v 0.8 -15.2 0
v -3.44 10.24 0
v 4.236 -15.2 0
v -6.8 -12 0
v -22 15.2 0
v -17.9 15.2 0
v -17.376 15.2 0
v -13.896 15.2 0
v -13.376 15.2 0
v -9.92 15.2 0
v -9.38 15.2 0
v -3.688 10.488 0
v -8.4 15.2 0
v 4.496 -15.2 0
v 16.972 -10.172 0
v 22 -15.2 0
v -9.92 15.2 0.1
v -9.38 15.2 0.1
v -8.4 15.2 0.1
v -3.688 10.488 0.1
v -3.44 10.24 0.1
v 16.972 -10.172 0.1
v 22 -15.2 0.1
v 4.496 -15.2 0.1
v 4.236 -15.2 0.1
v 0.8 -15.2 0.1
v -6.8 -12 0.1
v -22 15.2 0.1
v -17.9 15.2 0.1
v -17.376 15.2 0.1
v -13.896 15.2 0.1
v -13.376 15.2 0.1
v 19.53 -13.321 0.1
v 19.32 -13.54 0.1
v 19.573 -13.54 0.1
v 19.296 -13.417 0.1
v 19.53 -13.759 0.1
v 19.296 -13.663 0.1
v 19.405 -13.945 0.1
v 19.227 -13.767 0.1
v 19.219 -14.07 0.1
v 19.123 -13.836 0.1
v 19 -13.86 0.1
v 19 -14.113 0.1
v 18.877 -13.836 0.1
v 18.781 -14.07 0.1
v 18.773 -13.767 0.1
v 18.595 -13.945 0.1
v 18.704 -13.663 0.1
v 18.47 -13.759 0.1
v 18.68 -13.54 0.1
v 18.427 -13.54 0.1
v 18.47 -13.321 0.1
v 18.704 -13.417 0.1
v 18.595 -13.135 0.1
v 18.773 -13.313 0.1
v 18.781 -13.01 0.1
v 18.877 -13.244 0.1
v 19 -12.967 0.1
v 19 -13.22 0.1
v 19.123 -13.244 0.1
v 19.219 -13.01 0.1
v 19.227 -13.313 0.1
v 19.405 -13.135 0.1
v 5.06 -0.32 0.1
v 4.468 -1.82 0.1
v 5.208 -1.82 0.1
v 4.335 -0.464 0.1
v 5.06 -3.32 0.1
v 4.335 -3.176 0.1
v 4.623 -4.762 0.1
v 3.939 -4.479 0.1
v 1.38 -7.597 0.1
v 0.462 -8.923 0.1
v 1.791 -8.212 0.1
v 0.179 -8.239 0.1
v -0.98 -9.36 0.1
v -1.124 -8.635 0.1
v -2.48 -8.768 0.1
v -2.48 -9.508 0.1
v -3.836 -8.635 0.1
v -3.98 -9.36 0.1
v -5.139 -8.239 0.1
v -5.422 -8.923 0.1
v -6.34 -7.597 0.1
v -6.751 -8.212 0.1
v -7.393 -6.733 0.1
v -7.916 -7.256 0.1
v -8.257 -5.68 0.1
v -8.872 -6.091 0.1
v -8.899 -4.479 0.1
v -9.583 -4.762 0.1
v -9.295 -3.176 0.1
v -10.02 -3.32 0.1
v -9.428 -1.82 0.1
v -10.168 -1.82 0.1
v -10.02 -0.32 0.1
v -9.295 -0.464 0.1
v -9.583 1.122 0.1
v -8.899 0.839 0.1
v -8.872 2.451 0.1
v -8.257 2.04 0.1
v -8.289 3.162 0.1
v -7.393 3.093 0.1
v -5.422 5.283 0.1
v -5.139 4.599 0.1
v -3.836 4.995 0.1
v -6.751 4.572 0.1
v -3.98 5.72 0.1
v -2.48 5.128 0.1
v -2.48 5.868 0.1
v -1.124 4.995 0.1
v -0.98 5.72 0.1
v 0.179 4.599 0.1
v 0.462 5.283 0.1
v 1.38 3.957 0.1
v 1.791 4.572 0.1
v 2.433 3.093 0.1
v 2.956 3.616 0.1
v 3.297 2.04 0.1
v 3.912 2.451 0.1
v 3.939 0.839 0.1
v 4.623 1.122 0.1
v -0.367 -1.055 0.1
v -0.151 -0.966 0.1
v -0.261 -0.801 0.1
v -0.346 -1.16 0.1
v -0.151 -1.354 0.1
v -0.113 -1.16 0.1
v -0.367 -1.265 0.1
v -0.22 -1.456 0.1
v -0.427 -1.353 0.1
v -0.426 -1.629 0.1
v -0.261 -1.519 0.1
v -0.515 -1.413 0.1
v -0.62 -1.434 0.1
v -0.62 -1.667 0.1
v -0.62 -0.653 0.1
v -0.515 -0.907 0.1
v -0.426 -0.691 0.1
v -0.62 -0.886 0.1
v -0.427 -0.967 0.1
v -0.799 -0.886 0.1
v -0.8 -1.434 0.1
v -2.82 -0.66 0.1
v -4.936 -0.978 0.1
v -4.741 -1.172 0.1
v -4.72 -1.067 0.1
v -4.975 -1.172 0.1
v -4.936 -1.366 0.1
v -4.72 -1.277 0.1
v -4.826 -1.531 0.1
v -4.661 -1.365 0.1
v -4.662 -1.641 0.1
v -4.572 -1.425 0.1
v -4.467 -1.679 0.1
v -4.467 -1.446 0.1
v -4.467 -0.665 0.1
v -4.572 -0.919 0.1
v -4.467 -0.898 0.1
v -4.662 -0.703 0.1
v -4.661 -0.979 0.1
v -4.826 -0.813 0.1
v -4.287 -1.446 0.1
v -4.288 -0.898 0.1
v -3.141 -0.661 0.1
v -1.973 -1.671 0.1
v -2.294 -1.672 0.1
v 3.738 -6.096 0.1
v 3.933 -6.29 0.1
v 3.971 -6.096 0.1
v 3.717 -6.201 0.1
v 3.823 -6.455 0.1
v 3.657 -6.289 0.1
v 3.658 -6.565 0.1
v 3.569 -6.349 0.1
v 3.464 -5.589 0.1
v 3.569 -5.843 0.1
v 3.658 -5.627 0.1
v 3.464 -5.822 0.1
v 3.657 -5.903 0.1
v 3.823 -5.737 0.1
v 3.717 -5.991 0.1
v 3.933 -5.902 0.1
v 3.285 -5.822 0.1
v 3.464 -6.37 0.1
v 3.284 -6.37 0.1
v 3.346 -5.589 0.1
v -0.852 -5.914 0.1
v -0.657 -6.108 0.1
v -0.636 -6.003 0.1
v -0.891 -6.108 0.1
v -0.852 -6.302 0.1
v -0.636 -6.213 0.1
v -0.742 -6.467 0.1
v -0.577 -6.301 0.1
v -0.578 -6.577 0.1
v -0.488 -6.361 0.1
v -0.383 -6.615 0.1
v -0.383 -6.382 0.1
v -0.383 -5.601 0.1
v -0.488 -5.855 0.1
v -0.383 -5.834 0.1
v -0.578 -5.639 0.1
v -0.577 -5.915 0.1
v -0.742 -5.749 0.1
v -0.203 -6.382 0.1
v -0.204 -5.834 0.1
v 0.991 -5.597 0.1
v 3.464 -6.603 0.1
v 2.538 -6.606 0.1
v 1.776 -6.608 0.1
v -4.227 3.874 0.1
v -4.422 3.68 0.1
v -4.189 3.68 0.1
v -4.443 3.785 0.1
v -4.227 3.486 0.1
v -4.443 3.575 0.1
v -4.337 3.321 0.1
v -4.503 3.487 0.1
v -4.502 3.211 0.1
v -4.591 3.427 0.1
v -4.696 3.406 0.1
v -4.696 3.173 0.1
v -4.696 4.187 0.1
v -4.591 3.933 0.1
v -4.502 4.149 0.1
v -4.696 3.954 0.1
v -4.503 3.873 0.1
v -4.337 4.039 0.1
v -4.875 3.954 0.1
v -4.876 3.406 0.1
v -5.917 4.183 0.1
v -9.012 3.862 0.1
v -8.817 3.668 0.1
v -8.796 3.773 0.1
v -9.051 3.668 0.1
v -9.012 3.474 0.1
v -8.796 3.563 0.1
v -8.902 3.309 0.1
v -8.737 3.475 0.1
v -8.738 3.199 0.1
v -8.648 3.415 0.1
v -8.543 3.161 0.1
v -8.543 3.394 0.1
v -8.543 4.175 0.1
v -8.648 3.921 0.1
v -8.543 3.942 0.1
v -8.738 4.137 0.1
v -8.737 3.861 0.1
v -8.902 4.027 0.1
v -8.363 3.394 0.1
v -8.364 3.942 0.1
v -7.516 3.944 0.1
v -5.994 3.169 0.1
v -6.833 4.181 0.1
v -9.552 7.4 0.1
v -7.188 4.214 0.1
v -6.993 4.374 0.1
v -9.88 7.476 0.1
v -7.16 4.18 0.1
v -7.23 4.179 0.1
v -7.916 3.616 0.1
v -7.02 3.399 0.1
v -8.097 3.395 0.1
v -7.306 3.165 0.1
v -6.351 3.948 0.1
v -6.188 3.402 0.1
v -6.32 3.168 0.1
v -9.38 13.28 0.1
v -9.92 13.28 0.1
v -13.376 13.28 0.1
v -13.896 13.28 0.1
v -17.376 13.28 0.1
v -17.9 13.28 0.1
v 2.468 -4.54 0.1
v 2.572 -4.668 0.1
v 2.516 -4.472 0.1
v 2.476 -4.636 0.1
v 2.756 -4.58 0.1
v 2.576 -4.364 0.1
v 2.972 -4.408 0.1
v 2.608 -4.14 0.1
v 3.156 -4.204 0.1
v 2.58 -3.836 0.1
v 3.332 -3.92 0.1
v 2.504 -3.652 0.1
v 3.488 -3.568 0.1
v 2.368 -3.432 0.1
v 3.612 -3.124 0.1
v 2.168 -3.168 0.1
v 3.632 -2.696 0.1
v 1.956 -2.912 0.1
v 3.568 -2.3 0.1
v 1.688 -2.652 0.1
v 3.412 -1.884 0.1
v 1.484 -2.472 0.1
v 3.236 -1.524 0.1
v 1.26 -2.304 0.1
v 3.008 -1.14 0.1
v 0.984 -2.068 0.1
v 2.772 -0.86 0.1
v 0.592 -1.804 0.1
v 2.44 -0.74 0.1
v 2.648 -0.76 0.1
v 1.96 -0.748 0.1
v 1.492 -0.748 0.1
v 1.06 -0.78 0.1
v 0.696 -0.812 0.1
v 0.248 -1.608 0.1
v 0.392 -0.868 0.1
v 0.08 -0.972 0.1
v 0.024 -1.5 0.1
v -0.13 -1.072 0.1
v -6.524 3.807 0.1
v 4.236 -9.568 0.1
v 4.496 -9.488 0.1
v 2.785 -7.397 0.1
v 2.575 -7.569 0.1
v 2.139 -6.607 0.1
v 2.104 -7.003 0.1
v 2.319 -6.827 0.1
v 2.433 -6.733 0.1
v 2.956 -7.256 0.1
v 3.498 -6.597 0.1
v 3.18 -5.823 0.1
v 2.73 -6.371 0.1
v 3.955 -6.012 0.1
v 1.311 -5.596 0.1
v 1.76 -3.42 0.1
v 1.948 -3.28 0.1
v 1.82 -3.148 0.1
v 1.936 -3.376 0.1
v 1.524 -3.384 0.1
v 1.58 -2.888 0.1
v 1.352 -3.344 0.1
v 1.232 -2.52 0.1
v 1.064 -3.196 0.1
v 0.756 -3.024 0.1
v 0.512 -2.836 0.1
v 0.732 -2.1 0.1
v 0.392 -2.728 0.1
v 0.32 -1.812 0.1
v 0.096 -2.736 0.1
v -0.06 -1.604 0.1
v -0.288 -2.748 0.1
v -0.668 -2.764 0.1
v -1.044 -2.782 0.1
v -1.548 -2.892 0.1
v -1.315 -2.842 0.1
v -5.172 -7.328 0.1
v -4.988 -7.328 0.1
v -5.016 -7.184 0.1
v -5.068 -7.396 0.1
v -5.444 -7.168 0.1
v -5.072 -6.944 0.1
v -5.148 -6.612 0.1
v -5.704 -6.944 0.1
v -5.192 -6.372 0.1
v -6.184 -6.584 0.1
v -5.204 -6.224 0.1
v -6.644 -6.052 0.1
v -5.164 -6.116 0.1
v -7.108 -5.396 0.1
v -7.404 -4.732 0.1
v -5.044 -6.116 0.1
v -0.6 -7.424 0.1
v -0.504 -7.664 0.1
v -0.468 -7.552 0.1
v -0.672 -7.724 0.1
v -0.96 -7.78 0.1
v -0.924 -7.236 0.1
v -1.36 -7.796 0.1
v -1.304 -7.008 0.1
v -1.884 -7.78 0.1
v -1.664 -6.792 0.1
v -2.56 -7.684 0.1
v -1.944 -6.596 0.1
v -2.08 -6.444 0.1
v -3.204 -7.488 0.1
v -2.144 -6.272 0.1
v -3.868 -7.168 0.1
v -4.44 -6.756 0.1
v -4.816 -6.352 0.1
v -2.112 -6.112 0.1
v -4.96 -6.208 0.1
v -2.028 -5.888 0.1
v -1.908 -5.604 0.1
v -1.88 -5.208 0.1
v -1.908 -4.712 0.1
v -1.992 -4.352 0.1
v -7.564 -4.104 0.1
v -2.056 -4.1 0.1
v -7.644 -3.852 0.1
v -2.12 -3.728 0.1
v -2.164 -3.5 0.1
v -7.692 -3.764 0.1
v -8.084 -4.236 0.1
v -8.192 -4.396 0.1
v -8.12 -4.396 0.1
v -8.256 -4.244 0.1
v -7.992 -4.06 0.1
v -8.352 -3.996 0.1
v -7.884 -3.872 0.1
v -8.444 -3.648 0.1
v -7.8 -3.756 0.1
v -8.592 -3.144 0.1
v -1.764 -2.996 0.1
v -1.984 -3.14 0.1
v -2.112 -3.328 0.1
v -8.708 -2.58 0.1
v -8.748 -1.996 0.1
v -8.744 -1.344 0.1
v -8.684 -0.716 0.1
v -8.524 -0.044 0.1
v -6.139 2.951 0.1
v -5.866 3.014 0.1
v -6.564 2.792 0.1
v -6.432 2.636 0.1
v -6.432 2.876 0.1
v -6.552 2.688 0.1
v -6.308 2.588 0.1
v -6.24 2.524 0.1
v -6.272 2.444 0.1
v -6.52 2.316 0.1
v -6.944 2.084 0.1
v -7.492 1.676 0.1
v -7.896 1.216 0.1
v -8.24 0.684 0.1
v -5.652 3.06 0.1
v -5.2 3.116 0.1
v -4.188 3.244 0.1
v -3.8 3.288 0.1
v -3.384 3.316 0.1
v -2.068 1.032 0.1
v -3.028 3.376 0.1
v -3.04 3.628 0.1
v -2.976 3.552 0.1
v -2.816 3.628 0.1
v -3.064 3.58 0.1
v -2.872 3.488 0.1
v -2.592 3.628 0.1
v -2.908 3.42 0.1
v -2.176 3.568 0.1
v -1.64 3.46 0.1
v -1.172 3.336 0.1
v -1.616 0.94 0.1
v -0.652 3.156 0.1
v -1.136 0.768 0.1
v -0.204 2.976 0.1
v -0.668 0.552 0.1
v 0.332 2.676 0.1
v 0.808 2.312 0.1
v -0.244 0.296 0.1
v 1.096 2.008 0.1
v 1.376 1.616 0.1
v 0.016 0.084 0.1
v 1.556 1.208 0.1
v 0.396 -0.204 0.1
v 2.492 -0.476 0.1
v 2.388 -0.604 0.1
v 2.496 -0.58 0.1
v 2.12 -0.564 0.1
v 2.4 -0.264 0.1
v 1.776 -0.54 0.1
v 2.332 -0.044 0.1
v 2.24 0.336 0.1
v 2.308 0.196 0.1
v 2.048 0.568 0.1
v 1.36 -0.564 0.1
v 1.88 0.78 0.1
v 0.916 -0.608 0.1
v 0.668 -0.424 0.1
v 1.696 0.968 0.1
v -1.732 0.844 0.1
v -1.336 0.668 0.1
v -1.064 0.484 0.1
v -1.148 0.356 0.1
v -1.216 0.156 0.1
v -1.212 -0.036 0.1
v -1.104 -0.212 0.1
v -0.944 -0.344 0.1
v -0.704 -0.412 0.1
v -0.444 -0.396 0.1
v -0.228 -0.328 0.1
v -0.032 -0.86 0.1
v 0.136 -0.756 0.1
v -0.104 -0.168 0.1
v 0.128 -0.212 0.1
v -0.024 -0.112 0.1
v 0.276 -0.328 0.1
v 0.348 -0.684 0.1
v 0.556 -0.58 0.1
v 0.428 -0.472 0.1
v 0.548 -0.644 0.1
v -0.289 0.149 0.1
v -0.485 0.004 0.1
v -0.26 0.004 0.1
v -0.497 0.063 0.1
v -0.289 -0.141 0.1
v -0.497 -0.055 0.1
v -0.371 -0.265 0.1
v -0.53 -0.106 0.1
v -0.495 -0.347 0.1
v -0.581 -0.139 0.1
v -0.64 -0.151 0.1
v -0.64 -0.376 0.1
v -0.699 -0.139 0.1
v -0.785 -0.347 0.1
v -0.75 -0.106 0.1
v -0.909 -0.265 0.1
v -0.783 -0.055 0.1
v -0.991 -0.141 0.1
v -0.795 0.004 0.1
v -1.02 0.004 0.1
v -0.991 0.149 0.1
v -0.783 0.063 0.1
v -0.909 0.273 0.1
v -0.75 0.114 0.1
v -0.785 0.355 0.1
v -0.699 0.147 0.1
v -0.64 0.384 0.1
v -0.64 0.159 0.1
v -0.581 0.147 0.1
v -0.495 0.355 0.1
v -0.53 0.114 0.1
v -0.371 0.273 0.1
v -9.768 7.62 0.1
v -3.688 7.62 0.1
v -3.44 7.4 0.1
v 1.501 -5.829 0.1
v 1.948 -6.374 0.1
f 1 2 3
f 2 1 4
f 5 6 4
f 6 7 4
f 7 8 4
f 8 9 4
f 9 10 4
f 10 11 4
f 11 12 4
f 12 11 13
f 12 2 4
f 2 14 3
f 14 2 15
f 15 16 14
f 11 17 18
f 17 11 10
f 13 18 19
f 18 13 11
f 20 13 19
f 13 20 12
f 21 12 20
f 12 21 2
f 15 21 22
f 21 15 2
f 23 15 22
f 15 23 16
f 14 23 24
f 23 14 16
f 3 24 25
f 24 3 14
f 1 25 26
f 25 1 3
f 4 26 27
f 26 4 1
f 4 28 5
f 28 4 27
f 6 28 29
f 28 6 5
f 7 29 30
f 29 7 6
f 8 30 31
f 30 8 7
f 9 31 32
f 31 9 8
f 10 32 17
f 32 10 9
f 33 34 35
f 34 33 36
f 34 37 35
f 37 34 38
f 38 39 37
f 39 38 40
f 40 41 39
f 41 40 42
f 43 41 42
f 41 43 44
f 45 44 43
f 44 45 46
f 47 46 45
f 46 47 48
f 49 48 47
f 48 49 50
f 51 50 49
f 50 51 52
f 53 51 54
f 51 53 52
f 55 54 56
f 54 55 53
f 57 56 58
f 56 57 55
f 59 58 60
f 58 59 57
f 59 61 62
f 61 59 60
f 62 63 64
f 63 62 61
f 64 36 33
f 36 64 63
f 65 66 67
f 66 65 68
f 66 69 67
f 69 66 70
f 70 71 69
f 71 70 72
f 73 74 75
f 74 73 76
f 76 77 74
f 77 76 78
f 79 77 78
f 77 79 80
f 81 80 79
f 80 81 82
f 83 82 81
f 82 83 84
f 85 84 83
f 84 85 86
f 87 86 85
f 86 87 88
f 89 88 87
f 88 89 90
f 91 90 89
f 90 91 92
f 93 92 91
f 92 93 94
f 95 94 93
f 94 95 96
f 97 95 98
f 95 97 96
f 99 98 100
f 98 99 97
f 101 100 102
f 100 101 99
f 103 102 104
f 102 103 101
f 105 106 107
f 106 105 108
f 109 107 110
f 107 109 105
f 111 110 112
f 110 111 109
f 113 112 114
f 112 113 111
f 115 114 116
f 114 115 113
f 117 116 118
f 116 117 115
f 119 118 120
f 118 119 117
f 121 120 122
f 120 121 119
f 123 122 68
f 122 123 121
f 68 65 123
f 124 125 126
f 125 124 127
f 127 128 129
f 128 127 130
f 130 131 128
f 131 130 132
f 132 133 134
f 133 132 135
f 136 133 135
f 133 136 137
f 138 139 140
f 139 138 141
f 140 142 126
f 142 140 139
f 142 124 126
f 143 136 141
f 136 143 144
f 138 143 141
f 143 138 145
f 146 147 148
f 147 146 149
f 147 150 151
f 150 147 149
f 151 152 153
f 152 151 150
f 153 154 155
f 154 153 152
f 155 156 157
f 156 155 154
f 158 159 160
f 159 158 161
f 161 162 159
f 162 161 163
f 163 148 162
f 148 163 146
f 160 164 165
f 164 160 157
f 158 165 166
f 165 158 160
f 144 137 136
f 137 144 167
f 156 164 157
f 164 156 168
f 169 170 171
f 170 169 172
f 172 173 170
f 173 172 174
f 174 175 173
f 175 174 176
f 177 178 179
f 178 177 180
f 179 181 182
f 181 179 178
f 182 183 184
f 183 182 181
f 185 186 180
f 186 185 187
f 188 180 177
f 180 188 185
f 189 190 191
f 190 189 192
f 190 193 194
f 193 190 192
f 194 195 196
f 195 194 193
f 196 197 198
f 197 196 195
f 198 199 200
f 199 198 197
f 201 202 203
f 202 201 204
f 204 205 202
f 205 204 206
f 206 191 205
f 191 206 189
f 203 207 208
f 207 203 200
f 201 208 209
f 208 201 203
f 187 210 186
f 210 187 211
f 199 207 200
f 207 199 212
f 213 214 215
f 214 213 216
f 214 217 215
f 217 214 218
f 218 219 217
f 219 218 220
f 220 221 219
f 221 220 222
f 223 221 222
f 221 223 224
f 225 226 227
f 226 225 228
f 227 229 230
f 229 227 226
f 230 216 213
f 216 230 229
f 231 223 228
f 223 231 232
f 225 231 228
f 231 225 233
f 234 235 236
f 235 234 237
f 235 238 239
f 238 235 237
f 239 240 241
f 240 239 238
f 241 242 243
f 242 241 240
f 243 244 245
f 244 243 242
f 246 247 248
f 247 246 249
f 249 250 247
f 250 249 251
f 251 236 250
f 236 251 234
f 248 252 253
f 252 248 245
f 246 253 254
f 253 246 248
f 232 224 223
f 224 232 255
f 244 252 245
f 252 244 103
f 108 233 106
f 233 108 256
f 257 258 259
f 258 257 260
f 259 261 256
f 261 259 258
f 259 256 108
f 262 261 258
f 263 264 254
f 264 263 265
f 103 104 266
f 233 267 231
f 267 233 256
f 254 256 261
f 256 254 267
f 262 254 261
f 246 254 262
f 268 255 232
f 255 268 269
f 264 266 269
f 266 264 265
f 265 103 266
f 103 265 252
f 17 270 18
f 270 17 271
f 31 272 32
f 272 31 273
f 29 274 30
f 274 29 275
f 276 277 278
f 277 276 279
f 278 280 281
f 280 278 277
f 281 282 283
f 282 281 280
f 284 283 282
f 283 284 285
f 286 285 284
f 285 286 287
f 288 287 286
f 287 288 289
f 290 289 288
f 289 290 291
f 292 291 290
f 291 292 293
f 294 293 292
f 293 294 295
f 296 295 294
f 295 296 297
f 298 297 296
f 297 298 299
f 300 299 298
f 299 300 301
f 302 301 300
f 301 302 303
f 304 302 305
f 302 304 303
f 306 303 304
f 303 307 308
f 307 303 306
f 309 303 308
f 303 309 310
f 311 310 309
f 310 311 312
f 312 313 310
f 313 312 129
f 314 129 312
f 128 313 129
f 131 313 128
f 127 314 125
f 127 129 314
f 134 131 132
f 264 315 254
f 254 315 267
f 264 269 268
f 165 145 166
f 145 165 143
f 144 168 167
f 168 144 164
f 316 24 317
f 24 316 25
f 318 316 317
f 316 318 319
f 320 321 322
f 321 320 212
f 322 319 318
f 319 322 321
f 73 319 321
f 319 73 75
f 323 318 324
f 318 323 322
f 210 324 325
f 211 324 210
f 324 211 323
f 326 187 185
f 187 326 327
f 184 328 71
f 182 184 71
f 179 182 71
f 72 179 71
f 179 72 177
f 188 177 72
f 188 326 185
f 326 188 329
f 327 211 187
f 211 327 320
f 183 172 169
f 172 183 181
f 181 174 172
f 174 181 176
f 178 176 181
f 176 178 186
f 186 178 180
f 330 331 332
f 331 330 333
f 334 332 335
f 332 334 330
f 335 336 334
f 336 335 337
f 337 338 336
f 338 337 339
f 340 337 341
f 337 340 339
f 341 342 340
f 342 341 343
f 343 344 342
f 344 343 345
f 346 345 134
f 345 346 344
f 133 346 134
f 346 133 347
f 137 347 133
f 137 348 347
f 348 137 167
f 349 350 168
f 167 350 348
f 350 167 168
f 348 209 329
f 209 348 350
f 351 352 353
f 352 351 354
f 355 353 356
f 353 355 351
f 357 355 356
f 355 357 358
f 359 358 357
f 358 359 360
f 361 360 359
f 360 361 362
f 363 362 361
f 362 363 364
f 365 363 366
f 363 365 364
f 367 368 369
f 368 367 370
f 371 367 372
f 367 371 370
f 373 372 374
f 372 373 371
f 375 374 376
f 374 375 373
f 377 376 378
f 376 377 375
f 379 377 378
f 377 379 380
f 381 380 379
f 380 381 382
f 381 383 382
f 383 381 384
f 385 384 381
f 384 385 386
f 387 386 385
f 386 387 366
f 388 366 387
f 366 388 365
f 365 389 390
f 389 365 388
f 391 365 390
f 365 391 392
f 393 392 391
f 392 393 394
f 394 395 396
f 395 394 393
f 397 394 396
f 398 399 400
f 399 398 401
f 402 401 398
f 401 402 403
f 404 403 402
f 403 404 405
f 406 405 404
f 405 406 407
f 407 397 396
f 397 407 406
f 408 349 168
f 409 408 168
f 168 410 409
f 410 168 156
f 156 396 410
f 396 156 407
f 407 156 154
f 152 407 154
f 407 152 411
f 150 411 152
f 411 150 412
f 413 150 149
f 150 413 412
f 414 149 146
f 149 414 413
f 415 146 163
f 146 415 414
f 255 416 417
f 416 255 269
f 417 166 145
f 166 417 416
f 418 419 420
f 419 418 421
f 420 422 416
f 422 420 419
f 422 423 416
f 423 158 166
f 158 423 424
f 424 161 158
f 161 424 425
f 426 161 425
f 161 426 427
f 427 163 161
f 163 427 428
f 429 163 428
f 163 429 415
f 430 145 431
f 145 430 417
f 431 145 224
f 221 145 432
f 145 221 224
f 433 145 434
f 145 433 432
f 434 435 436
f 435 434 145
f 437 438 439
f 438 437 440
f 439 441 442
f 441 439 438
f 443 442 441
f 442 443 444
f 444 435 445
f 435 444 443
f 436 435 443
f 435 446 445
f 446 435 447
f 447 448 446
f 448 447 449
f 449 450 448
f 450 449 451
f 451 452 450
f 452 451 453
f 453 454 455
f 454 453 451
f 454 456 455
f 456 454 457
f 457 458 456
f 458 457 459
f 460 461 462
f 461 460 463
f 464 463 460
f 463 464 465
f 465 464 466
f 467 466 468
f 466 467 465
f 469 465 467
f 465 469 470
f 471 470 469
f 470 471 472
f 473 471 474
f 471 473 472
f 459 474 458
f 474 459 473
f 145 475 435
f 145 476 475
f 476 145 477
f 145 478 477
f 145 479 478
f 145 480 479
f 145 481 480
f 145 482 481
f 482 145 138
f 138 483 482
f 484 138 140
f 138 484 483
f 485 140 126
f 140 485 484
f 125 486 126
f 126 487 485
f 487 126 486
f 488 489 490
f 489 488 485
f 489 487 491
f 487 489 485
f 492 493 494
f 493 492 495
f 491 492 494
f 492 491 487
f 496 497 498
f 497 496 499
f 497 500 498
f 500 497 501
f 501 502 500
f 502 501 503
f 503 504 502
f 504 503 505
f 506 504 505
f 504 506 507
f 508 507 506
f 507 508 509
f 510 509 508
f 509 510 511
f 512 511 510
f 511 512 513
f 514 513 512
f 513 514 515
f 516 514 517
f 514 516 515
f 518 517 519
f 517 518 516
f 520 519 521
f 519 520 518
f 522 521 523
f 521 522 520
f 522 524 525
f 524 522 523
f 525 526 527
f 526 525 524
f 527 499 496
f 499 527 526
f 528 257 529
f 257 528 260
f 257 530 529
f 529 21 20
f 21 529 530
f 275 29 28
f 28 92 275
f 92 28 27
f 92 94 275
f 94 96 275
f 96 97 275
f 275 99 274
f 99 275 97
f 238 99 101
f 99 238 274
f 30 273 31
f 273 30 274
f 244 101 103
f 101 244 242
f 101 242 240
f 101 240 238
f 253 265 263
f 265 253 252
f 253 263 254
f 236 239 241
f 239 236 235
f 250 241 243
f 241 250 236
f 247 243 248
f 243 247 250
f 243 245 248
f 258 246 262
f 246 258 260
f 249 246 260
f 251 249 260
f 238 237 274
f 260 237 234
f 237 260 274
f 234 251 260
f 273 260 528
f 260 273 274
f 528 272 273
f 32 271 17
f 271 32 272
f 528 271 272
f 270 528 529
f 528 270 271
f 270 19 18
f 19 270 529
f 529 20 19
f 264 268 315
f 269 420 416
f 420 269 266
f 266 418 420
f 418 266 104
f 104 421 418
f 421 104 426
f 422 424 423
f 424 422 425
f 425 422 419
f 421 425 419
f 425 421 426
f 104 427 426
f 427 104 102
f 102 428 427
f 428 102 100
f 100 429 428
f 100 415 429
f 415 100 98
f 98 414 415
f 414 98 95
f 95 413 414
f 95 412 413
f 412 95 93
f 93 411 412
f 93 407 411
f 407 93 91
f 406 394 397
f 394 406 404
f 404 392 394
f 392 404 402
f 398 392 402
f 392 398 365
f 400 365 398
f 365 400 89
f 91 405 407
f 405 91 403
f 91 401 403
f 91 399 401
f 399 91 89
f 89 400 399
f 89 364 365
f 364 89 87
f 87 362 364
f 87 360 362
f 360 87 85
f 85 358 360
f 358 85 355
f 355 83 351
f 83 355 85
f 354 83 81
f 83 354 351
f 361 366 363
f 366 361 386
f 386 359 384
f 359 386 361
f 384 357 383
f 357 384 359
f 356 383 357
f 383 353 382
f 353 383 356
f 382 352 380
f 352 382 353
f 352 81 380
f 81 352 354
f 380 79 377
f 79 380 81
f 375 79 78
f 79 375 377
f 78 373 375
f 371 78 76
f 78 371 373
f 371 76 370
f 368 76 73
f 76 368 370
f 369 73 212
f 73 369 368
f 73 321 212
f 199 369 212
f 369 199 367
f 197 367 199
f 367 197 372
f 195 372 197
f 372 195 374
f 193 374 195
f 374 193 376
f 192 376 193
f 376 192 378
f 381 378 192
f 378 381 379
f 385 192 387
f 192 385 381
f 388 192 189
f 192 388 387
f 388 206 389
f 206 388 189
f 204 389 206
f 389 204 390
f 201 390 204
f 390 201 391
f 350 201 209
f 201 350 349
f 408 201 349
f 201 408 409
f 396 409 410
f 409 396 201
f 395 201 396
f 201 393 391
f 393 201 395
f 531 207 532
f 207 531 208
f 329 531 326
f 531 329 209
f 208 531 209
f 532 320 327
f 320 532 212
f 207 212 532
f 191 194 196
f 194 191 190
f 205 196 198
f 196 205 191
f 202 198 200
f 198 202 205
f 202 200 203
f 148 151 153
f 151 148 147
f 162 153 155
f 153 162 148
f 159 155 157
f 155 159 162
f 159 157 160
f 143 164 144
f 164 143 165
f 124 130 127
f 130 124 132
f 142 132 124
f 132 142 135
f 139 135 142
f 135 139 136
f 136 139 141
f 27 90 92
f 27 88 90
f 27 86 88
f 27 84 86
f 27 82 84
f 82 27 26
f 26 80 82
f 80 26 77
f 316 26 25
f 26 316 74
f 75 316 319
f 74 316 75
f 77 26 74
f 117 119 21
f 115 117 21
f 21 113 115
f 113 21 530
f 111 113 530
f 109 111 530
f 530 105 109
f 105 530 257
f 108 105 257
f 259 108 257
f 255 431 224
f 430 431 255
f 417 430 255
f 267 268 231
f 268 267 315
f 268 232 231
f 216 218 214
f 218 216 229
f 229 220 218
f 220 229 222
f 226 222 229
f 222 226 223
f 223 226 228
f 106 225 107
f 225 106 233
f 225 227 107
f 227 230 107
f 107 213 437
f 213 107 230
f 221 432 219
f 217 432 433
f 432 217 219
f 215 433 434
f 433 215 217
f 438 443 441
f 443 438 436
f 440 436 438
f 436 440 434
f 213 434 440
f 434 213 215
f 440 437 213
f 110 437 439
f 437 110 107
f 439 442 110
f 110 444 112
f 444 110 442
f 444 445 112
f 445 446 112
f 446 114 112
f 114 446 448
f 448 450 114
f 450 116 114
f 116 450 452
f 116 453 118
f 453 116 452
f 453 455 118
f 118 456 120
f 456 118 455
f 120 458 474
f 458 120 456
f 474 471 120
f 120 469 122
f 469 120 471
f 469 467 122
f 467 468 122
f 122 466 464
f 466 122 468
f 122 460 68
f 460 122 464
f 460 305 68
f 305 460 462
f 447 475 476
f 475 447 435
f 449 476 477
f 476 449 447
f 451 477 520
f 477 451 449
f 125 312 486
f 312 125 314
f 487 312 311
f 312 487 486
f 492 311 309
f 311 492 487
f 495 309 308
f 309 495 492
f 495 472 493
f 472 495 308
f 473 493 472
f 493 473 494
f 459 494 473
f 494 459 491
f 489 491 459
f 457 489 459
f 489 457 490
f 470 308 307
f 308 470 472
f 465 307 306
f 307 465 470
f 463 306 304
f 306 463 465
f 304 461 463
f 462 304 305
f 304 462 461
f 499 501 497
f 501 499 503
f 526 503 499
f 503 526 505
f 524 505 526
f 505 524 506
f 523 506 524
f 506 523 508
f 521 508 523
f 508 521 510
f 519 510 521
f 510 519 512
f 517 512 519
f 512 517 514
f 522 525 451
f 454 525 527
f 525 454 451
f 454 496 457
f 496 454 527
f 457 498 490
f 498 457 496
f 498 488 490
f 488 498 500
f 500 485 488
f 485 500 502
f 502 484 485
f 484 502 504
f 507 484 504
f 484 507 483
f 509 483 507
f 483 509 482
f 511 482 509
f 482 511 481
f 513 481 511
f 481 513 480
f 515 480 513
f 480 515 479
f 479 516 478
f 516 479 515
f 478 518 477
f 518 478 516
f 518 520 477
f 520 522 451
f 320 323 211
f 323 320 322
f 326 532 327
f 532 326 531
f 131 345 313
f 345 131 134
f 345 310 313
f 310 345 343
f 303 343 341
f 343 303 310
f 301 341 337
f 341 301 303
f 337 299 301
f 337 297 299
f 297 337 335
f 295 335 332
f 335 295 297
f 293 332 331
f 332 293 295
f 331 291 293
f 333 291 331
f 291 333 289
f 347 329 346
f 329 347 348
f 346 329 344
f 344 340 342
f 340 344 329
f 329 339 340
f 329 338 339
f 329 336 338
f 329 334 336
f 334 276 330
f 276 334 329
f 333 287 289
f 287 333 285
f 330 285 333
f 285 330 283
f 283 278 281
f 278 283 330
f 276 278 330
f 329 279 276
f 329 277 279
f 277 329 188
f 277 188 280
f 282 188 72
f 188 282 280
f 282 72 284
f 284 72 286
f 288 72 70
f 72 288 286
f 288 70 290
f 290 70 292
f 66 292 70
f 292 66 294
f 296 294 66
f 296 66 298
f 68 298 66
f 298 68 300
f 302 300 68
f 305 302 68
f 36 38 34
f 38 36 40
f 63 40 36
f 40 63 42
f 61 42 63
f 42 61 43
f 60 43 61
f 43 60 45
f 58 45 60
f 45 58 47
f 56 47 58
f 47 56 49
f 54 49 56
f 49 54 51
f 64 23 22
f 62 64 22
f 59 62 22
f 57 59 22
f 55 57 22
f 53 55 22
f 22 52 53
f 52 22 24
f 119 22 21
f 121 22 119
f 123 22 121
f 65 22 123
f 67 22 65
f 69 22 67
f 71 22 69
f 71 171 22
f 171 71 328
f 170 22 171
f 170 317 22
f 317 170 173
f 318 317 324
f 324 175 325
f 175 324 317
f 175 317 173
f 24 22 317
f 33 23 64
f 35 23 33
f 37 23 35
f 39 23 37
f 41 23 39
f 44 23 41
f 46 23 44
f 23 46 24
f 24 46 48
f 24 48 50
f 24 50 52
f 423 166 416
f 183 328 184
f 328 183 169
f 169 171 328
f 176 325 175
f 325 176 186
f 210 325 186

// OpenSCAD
use <../lib.scad>
use <4613857b.scad>
$fa=1; $fs=0.2;
function ldraw_lib__4613857c(realsolid=false) = [
// 0 Sticker Tail Right with White Eagle Head in Circle on DkRed
// 0 Name: 4613857c.dat
// 0 Author: Christian Neumann [Wesley]
// 0 !LDRAW_ORG Part UPDATE 2012-02
// 0 !LICENSE Licensed under CC BY 2.0 and CC BY 4.0 : see CAreadme.txt
// 
// 0 !HELP place at -2 -40 30 0 1 0 0 0 -1 -1 0 0 on 6239.dat
// 
// 0 BFC CERTIFY CCW
  [0,"BFC","CERTIFY"],
  [0,"BFC","CCW"],
// 
// 0 !KEYWORDS Pharaoh's Quest
// 
// 0 !HISTORY 2012-08-09 [PTadmin] Official Update 2012-02
// 
// 
// 1 16 0 0 0 -1 0 0 0 1 0 0 0 1 4613857b.dat
  [1,16,0,0,0,-1,0,0,0,1,0,0,0,1, ldraw_lib__4613857b(realsolid)],
];
module ldraw_lib__4613857c(step=0, col=false, unit=2/5, alt=false, line=0.2, solid=!$preview)
    makepoly(ldraw_lib__4613857c(solid), step=step, col=col, unit=unit, alt=alt, line=line, solid=solid);
ldraw_lib__4613857c(line=0.2);
